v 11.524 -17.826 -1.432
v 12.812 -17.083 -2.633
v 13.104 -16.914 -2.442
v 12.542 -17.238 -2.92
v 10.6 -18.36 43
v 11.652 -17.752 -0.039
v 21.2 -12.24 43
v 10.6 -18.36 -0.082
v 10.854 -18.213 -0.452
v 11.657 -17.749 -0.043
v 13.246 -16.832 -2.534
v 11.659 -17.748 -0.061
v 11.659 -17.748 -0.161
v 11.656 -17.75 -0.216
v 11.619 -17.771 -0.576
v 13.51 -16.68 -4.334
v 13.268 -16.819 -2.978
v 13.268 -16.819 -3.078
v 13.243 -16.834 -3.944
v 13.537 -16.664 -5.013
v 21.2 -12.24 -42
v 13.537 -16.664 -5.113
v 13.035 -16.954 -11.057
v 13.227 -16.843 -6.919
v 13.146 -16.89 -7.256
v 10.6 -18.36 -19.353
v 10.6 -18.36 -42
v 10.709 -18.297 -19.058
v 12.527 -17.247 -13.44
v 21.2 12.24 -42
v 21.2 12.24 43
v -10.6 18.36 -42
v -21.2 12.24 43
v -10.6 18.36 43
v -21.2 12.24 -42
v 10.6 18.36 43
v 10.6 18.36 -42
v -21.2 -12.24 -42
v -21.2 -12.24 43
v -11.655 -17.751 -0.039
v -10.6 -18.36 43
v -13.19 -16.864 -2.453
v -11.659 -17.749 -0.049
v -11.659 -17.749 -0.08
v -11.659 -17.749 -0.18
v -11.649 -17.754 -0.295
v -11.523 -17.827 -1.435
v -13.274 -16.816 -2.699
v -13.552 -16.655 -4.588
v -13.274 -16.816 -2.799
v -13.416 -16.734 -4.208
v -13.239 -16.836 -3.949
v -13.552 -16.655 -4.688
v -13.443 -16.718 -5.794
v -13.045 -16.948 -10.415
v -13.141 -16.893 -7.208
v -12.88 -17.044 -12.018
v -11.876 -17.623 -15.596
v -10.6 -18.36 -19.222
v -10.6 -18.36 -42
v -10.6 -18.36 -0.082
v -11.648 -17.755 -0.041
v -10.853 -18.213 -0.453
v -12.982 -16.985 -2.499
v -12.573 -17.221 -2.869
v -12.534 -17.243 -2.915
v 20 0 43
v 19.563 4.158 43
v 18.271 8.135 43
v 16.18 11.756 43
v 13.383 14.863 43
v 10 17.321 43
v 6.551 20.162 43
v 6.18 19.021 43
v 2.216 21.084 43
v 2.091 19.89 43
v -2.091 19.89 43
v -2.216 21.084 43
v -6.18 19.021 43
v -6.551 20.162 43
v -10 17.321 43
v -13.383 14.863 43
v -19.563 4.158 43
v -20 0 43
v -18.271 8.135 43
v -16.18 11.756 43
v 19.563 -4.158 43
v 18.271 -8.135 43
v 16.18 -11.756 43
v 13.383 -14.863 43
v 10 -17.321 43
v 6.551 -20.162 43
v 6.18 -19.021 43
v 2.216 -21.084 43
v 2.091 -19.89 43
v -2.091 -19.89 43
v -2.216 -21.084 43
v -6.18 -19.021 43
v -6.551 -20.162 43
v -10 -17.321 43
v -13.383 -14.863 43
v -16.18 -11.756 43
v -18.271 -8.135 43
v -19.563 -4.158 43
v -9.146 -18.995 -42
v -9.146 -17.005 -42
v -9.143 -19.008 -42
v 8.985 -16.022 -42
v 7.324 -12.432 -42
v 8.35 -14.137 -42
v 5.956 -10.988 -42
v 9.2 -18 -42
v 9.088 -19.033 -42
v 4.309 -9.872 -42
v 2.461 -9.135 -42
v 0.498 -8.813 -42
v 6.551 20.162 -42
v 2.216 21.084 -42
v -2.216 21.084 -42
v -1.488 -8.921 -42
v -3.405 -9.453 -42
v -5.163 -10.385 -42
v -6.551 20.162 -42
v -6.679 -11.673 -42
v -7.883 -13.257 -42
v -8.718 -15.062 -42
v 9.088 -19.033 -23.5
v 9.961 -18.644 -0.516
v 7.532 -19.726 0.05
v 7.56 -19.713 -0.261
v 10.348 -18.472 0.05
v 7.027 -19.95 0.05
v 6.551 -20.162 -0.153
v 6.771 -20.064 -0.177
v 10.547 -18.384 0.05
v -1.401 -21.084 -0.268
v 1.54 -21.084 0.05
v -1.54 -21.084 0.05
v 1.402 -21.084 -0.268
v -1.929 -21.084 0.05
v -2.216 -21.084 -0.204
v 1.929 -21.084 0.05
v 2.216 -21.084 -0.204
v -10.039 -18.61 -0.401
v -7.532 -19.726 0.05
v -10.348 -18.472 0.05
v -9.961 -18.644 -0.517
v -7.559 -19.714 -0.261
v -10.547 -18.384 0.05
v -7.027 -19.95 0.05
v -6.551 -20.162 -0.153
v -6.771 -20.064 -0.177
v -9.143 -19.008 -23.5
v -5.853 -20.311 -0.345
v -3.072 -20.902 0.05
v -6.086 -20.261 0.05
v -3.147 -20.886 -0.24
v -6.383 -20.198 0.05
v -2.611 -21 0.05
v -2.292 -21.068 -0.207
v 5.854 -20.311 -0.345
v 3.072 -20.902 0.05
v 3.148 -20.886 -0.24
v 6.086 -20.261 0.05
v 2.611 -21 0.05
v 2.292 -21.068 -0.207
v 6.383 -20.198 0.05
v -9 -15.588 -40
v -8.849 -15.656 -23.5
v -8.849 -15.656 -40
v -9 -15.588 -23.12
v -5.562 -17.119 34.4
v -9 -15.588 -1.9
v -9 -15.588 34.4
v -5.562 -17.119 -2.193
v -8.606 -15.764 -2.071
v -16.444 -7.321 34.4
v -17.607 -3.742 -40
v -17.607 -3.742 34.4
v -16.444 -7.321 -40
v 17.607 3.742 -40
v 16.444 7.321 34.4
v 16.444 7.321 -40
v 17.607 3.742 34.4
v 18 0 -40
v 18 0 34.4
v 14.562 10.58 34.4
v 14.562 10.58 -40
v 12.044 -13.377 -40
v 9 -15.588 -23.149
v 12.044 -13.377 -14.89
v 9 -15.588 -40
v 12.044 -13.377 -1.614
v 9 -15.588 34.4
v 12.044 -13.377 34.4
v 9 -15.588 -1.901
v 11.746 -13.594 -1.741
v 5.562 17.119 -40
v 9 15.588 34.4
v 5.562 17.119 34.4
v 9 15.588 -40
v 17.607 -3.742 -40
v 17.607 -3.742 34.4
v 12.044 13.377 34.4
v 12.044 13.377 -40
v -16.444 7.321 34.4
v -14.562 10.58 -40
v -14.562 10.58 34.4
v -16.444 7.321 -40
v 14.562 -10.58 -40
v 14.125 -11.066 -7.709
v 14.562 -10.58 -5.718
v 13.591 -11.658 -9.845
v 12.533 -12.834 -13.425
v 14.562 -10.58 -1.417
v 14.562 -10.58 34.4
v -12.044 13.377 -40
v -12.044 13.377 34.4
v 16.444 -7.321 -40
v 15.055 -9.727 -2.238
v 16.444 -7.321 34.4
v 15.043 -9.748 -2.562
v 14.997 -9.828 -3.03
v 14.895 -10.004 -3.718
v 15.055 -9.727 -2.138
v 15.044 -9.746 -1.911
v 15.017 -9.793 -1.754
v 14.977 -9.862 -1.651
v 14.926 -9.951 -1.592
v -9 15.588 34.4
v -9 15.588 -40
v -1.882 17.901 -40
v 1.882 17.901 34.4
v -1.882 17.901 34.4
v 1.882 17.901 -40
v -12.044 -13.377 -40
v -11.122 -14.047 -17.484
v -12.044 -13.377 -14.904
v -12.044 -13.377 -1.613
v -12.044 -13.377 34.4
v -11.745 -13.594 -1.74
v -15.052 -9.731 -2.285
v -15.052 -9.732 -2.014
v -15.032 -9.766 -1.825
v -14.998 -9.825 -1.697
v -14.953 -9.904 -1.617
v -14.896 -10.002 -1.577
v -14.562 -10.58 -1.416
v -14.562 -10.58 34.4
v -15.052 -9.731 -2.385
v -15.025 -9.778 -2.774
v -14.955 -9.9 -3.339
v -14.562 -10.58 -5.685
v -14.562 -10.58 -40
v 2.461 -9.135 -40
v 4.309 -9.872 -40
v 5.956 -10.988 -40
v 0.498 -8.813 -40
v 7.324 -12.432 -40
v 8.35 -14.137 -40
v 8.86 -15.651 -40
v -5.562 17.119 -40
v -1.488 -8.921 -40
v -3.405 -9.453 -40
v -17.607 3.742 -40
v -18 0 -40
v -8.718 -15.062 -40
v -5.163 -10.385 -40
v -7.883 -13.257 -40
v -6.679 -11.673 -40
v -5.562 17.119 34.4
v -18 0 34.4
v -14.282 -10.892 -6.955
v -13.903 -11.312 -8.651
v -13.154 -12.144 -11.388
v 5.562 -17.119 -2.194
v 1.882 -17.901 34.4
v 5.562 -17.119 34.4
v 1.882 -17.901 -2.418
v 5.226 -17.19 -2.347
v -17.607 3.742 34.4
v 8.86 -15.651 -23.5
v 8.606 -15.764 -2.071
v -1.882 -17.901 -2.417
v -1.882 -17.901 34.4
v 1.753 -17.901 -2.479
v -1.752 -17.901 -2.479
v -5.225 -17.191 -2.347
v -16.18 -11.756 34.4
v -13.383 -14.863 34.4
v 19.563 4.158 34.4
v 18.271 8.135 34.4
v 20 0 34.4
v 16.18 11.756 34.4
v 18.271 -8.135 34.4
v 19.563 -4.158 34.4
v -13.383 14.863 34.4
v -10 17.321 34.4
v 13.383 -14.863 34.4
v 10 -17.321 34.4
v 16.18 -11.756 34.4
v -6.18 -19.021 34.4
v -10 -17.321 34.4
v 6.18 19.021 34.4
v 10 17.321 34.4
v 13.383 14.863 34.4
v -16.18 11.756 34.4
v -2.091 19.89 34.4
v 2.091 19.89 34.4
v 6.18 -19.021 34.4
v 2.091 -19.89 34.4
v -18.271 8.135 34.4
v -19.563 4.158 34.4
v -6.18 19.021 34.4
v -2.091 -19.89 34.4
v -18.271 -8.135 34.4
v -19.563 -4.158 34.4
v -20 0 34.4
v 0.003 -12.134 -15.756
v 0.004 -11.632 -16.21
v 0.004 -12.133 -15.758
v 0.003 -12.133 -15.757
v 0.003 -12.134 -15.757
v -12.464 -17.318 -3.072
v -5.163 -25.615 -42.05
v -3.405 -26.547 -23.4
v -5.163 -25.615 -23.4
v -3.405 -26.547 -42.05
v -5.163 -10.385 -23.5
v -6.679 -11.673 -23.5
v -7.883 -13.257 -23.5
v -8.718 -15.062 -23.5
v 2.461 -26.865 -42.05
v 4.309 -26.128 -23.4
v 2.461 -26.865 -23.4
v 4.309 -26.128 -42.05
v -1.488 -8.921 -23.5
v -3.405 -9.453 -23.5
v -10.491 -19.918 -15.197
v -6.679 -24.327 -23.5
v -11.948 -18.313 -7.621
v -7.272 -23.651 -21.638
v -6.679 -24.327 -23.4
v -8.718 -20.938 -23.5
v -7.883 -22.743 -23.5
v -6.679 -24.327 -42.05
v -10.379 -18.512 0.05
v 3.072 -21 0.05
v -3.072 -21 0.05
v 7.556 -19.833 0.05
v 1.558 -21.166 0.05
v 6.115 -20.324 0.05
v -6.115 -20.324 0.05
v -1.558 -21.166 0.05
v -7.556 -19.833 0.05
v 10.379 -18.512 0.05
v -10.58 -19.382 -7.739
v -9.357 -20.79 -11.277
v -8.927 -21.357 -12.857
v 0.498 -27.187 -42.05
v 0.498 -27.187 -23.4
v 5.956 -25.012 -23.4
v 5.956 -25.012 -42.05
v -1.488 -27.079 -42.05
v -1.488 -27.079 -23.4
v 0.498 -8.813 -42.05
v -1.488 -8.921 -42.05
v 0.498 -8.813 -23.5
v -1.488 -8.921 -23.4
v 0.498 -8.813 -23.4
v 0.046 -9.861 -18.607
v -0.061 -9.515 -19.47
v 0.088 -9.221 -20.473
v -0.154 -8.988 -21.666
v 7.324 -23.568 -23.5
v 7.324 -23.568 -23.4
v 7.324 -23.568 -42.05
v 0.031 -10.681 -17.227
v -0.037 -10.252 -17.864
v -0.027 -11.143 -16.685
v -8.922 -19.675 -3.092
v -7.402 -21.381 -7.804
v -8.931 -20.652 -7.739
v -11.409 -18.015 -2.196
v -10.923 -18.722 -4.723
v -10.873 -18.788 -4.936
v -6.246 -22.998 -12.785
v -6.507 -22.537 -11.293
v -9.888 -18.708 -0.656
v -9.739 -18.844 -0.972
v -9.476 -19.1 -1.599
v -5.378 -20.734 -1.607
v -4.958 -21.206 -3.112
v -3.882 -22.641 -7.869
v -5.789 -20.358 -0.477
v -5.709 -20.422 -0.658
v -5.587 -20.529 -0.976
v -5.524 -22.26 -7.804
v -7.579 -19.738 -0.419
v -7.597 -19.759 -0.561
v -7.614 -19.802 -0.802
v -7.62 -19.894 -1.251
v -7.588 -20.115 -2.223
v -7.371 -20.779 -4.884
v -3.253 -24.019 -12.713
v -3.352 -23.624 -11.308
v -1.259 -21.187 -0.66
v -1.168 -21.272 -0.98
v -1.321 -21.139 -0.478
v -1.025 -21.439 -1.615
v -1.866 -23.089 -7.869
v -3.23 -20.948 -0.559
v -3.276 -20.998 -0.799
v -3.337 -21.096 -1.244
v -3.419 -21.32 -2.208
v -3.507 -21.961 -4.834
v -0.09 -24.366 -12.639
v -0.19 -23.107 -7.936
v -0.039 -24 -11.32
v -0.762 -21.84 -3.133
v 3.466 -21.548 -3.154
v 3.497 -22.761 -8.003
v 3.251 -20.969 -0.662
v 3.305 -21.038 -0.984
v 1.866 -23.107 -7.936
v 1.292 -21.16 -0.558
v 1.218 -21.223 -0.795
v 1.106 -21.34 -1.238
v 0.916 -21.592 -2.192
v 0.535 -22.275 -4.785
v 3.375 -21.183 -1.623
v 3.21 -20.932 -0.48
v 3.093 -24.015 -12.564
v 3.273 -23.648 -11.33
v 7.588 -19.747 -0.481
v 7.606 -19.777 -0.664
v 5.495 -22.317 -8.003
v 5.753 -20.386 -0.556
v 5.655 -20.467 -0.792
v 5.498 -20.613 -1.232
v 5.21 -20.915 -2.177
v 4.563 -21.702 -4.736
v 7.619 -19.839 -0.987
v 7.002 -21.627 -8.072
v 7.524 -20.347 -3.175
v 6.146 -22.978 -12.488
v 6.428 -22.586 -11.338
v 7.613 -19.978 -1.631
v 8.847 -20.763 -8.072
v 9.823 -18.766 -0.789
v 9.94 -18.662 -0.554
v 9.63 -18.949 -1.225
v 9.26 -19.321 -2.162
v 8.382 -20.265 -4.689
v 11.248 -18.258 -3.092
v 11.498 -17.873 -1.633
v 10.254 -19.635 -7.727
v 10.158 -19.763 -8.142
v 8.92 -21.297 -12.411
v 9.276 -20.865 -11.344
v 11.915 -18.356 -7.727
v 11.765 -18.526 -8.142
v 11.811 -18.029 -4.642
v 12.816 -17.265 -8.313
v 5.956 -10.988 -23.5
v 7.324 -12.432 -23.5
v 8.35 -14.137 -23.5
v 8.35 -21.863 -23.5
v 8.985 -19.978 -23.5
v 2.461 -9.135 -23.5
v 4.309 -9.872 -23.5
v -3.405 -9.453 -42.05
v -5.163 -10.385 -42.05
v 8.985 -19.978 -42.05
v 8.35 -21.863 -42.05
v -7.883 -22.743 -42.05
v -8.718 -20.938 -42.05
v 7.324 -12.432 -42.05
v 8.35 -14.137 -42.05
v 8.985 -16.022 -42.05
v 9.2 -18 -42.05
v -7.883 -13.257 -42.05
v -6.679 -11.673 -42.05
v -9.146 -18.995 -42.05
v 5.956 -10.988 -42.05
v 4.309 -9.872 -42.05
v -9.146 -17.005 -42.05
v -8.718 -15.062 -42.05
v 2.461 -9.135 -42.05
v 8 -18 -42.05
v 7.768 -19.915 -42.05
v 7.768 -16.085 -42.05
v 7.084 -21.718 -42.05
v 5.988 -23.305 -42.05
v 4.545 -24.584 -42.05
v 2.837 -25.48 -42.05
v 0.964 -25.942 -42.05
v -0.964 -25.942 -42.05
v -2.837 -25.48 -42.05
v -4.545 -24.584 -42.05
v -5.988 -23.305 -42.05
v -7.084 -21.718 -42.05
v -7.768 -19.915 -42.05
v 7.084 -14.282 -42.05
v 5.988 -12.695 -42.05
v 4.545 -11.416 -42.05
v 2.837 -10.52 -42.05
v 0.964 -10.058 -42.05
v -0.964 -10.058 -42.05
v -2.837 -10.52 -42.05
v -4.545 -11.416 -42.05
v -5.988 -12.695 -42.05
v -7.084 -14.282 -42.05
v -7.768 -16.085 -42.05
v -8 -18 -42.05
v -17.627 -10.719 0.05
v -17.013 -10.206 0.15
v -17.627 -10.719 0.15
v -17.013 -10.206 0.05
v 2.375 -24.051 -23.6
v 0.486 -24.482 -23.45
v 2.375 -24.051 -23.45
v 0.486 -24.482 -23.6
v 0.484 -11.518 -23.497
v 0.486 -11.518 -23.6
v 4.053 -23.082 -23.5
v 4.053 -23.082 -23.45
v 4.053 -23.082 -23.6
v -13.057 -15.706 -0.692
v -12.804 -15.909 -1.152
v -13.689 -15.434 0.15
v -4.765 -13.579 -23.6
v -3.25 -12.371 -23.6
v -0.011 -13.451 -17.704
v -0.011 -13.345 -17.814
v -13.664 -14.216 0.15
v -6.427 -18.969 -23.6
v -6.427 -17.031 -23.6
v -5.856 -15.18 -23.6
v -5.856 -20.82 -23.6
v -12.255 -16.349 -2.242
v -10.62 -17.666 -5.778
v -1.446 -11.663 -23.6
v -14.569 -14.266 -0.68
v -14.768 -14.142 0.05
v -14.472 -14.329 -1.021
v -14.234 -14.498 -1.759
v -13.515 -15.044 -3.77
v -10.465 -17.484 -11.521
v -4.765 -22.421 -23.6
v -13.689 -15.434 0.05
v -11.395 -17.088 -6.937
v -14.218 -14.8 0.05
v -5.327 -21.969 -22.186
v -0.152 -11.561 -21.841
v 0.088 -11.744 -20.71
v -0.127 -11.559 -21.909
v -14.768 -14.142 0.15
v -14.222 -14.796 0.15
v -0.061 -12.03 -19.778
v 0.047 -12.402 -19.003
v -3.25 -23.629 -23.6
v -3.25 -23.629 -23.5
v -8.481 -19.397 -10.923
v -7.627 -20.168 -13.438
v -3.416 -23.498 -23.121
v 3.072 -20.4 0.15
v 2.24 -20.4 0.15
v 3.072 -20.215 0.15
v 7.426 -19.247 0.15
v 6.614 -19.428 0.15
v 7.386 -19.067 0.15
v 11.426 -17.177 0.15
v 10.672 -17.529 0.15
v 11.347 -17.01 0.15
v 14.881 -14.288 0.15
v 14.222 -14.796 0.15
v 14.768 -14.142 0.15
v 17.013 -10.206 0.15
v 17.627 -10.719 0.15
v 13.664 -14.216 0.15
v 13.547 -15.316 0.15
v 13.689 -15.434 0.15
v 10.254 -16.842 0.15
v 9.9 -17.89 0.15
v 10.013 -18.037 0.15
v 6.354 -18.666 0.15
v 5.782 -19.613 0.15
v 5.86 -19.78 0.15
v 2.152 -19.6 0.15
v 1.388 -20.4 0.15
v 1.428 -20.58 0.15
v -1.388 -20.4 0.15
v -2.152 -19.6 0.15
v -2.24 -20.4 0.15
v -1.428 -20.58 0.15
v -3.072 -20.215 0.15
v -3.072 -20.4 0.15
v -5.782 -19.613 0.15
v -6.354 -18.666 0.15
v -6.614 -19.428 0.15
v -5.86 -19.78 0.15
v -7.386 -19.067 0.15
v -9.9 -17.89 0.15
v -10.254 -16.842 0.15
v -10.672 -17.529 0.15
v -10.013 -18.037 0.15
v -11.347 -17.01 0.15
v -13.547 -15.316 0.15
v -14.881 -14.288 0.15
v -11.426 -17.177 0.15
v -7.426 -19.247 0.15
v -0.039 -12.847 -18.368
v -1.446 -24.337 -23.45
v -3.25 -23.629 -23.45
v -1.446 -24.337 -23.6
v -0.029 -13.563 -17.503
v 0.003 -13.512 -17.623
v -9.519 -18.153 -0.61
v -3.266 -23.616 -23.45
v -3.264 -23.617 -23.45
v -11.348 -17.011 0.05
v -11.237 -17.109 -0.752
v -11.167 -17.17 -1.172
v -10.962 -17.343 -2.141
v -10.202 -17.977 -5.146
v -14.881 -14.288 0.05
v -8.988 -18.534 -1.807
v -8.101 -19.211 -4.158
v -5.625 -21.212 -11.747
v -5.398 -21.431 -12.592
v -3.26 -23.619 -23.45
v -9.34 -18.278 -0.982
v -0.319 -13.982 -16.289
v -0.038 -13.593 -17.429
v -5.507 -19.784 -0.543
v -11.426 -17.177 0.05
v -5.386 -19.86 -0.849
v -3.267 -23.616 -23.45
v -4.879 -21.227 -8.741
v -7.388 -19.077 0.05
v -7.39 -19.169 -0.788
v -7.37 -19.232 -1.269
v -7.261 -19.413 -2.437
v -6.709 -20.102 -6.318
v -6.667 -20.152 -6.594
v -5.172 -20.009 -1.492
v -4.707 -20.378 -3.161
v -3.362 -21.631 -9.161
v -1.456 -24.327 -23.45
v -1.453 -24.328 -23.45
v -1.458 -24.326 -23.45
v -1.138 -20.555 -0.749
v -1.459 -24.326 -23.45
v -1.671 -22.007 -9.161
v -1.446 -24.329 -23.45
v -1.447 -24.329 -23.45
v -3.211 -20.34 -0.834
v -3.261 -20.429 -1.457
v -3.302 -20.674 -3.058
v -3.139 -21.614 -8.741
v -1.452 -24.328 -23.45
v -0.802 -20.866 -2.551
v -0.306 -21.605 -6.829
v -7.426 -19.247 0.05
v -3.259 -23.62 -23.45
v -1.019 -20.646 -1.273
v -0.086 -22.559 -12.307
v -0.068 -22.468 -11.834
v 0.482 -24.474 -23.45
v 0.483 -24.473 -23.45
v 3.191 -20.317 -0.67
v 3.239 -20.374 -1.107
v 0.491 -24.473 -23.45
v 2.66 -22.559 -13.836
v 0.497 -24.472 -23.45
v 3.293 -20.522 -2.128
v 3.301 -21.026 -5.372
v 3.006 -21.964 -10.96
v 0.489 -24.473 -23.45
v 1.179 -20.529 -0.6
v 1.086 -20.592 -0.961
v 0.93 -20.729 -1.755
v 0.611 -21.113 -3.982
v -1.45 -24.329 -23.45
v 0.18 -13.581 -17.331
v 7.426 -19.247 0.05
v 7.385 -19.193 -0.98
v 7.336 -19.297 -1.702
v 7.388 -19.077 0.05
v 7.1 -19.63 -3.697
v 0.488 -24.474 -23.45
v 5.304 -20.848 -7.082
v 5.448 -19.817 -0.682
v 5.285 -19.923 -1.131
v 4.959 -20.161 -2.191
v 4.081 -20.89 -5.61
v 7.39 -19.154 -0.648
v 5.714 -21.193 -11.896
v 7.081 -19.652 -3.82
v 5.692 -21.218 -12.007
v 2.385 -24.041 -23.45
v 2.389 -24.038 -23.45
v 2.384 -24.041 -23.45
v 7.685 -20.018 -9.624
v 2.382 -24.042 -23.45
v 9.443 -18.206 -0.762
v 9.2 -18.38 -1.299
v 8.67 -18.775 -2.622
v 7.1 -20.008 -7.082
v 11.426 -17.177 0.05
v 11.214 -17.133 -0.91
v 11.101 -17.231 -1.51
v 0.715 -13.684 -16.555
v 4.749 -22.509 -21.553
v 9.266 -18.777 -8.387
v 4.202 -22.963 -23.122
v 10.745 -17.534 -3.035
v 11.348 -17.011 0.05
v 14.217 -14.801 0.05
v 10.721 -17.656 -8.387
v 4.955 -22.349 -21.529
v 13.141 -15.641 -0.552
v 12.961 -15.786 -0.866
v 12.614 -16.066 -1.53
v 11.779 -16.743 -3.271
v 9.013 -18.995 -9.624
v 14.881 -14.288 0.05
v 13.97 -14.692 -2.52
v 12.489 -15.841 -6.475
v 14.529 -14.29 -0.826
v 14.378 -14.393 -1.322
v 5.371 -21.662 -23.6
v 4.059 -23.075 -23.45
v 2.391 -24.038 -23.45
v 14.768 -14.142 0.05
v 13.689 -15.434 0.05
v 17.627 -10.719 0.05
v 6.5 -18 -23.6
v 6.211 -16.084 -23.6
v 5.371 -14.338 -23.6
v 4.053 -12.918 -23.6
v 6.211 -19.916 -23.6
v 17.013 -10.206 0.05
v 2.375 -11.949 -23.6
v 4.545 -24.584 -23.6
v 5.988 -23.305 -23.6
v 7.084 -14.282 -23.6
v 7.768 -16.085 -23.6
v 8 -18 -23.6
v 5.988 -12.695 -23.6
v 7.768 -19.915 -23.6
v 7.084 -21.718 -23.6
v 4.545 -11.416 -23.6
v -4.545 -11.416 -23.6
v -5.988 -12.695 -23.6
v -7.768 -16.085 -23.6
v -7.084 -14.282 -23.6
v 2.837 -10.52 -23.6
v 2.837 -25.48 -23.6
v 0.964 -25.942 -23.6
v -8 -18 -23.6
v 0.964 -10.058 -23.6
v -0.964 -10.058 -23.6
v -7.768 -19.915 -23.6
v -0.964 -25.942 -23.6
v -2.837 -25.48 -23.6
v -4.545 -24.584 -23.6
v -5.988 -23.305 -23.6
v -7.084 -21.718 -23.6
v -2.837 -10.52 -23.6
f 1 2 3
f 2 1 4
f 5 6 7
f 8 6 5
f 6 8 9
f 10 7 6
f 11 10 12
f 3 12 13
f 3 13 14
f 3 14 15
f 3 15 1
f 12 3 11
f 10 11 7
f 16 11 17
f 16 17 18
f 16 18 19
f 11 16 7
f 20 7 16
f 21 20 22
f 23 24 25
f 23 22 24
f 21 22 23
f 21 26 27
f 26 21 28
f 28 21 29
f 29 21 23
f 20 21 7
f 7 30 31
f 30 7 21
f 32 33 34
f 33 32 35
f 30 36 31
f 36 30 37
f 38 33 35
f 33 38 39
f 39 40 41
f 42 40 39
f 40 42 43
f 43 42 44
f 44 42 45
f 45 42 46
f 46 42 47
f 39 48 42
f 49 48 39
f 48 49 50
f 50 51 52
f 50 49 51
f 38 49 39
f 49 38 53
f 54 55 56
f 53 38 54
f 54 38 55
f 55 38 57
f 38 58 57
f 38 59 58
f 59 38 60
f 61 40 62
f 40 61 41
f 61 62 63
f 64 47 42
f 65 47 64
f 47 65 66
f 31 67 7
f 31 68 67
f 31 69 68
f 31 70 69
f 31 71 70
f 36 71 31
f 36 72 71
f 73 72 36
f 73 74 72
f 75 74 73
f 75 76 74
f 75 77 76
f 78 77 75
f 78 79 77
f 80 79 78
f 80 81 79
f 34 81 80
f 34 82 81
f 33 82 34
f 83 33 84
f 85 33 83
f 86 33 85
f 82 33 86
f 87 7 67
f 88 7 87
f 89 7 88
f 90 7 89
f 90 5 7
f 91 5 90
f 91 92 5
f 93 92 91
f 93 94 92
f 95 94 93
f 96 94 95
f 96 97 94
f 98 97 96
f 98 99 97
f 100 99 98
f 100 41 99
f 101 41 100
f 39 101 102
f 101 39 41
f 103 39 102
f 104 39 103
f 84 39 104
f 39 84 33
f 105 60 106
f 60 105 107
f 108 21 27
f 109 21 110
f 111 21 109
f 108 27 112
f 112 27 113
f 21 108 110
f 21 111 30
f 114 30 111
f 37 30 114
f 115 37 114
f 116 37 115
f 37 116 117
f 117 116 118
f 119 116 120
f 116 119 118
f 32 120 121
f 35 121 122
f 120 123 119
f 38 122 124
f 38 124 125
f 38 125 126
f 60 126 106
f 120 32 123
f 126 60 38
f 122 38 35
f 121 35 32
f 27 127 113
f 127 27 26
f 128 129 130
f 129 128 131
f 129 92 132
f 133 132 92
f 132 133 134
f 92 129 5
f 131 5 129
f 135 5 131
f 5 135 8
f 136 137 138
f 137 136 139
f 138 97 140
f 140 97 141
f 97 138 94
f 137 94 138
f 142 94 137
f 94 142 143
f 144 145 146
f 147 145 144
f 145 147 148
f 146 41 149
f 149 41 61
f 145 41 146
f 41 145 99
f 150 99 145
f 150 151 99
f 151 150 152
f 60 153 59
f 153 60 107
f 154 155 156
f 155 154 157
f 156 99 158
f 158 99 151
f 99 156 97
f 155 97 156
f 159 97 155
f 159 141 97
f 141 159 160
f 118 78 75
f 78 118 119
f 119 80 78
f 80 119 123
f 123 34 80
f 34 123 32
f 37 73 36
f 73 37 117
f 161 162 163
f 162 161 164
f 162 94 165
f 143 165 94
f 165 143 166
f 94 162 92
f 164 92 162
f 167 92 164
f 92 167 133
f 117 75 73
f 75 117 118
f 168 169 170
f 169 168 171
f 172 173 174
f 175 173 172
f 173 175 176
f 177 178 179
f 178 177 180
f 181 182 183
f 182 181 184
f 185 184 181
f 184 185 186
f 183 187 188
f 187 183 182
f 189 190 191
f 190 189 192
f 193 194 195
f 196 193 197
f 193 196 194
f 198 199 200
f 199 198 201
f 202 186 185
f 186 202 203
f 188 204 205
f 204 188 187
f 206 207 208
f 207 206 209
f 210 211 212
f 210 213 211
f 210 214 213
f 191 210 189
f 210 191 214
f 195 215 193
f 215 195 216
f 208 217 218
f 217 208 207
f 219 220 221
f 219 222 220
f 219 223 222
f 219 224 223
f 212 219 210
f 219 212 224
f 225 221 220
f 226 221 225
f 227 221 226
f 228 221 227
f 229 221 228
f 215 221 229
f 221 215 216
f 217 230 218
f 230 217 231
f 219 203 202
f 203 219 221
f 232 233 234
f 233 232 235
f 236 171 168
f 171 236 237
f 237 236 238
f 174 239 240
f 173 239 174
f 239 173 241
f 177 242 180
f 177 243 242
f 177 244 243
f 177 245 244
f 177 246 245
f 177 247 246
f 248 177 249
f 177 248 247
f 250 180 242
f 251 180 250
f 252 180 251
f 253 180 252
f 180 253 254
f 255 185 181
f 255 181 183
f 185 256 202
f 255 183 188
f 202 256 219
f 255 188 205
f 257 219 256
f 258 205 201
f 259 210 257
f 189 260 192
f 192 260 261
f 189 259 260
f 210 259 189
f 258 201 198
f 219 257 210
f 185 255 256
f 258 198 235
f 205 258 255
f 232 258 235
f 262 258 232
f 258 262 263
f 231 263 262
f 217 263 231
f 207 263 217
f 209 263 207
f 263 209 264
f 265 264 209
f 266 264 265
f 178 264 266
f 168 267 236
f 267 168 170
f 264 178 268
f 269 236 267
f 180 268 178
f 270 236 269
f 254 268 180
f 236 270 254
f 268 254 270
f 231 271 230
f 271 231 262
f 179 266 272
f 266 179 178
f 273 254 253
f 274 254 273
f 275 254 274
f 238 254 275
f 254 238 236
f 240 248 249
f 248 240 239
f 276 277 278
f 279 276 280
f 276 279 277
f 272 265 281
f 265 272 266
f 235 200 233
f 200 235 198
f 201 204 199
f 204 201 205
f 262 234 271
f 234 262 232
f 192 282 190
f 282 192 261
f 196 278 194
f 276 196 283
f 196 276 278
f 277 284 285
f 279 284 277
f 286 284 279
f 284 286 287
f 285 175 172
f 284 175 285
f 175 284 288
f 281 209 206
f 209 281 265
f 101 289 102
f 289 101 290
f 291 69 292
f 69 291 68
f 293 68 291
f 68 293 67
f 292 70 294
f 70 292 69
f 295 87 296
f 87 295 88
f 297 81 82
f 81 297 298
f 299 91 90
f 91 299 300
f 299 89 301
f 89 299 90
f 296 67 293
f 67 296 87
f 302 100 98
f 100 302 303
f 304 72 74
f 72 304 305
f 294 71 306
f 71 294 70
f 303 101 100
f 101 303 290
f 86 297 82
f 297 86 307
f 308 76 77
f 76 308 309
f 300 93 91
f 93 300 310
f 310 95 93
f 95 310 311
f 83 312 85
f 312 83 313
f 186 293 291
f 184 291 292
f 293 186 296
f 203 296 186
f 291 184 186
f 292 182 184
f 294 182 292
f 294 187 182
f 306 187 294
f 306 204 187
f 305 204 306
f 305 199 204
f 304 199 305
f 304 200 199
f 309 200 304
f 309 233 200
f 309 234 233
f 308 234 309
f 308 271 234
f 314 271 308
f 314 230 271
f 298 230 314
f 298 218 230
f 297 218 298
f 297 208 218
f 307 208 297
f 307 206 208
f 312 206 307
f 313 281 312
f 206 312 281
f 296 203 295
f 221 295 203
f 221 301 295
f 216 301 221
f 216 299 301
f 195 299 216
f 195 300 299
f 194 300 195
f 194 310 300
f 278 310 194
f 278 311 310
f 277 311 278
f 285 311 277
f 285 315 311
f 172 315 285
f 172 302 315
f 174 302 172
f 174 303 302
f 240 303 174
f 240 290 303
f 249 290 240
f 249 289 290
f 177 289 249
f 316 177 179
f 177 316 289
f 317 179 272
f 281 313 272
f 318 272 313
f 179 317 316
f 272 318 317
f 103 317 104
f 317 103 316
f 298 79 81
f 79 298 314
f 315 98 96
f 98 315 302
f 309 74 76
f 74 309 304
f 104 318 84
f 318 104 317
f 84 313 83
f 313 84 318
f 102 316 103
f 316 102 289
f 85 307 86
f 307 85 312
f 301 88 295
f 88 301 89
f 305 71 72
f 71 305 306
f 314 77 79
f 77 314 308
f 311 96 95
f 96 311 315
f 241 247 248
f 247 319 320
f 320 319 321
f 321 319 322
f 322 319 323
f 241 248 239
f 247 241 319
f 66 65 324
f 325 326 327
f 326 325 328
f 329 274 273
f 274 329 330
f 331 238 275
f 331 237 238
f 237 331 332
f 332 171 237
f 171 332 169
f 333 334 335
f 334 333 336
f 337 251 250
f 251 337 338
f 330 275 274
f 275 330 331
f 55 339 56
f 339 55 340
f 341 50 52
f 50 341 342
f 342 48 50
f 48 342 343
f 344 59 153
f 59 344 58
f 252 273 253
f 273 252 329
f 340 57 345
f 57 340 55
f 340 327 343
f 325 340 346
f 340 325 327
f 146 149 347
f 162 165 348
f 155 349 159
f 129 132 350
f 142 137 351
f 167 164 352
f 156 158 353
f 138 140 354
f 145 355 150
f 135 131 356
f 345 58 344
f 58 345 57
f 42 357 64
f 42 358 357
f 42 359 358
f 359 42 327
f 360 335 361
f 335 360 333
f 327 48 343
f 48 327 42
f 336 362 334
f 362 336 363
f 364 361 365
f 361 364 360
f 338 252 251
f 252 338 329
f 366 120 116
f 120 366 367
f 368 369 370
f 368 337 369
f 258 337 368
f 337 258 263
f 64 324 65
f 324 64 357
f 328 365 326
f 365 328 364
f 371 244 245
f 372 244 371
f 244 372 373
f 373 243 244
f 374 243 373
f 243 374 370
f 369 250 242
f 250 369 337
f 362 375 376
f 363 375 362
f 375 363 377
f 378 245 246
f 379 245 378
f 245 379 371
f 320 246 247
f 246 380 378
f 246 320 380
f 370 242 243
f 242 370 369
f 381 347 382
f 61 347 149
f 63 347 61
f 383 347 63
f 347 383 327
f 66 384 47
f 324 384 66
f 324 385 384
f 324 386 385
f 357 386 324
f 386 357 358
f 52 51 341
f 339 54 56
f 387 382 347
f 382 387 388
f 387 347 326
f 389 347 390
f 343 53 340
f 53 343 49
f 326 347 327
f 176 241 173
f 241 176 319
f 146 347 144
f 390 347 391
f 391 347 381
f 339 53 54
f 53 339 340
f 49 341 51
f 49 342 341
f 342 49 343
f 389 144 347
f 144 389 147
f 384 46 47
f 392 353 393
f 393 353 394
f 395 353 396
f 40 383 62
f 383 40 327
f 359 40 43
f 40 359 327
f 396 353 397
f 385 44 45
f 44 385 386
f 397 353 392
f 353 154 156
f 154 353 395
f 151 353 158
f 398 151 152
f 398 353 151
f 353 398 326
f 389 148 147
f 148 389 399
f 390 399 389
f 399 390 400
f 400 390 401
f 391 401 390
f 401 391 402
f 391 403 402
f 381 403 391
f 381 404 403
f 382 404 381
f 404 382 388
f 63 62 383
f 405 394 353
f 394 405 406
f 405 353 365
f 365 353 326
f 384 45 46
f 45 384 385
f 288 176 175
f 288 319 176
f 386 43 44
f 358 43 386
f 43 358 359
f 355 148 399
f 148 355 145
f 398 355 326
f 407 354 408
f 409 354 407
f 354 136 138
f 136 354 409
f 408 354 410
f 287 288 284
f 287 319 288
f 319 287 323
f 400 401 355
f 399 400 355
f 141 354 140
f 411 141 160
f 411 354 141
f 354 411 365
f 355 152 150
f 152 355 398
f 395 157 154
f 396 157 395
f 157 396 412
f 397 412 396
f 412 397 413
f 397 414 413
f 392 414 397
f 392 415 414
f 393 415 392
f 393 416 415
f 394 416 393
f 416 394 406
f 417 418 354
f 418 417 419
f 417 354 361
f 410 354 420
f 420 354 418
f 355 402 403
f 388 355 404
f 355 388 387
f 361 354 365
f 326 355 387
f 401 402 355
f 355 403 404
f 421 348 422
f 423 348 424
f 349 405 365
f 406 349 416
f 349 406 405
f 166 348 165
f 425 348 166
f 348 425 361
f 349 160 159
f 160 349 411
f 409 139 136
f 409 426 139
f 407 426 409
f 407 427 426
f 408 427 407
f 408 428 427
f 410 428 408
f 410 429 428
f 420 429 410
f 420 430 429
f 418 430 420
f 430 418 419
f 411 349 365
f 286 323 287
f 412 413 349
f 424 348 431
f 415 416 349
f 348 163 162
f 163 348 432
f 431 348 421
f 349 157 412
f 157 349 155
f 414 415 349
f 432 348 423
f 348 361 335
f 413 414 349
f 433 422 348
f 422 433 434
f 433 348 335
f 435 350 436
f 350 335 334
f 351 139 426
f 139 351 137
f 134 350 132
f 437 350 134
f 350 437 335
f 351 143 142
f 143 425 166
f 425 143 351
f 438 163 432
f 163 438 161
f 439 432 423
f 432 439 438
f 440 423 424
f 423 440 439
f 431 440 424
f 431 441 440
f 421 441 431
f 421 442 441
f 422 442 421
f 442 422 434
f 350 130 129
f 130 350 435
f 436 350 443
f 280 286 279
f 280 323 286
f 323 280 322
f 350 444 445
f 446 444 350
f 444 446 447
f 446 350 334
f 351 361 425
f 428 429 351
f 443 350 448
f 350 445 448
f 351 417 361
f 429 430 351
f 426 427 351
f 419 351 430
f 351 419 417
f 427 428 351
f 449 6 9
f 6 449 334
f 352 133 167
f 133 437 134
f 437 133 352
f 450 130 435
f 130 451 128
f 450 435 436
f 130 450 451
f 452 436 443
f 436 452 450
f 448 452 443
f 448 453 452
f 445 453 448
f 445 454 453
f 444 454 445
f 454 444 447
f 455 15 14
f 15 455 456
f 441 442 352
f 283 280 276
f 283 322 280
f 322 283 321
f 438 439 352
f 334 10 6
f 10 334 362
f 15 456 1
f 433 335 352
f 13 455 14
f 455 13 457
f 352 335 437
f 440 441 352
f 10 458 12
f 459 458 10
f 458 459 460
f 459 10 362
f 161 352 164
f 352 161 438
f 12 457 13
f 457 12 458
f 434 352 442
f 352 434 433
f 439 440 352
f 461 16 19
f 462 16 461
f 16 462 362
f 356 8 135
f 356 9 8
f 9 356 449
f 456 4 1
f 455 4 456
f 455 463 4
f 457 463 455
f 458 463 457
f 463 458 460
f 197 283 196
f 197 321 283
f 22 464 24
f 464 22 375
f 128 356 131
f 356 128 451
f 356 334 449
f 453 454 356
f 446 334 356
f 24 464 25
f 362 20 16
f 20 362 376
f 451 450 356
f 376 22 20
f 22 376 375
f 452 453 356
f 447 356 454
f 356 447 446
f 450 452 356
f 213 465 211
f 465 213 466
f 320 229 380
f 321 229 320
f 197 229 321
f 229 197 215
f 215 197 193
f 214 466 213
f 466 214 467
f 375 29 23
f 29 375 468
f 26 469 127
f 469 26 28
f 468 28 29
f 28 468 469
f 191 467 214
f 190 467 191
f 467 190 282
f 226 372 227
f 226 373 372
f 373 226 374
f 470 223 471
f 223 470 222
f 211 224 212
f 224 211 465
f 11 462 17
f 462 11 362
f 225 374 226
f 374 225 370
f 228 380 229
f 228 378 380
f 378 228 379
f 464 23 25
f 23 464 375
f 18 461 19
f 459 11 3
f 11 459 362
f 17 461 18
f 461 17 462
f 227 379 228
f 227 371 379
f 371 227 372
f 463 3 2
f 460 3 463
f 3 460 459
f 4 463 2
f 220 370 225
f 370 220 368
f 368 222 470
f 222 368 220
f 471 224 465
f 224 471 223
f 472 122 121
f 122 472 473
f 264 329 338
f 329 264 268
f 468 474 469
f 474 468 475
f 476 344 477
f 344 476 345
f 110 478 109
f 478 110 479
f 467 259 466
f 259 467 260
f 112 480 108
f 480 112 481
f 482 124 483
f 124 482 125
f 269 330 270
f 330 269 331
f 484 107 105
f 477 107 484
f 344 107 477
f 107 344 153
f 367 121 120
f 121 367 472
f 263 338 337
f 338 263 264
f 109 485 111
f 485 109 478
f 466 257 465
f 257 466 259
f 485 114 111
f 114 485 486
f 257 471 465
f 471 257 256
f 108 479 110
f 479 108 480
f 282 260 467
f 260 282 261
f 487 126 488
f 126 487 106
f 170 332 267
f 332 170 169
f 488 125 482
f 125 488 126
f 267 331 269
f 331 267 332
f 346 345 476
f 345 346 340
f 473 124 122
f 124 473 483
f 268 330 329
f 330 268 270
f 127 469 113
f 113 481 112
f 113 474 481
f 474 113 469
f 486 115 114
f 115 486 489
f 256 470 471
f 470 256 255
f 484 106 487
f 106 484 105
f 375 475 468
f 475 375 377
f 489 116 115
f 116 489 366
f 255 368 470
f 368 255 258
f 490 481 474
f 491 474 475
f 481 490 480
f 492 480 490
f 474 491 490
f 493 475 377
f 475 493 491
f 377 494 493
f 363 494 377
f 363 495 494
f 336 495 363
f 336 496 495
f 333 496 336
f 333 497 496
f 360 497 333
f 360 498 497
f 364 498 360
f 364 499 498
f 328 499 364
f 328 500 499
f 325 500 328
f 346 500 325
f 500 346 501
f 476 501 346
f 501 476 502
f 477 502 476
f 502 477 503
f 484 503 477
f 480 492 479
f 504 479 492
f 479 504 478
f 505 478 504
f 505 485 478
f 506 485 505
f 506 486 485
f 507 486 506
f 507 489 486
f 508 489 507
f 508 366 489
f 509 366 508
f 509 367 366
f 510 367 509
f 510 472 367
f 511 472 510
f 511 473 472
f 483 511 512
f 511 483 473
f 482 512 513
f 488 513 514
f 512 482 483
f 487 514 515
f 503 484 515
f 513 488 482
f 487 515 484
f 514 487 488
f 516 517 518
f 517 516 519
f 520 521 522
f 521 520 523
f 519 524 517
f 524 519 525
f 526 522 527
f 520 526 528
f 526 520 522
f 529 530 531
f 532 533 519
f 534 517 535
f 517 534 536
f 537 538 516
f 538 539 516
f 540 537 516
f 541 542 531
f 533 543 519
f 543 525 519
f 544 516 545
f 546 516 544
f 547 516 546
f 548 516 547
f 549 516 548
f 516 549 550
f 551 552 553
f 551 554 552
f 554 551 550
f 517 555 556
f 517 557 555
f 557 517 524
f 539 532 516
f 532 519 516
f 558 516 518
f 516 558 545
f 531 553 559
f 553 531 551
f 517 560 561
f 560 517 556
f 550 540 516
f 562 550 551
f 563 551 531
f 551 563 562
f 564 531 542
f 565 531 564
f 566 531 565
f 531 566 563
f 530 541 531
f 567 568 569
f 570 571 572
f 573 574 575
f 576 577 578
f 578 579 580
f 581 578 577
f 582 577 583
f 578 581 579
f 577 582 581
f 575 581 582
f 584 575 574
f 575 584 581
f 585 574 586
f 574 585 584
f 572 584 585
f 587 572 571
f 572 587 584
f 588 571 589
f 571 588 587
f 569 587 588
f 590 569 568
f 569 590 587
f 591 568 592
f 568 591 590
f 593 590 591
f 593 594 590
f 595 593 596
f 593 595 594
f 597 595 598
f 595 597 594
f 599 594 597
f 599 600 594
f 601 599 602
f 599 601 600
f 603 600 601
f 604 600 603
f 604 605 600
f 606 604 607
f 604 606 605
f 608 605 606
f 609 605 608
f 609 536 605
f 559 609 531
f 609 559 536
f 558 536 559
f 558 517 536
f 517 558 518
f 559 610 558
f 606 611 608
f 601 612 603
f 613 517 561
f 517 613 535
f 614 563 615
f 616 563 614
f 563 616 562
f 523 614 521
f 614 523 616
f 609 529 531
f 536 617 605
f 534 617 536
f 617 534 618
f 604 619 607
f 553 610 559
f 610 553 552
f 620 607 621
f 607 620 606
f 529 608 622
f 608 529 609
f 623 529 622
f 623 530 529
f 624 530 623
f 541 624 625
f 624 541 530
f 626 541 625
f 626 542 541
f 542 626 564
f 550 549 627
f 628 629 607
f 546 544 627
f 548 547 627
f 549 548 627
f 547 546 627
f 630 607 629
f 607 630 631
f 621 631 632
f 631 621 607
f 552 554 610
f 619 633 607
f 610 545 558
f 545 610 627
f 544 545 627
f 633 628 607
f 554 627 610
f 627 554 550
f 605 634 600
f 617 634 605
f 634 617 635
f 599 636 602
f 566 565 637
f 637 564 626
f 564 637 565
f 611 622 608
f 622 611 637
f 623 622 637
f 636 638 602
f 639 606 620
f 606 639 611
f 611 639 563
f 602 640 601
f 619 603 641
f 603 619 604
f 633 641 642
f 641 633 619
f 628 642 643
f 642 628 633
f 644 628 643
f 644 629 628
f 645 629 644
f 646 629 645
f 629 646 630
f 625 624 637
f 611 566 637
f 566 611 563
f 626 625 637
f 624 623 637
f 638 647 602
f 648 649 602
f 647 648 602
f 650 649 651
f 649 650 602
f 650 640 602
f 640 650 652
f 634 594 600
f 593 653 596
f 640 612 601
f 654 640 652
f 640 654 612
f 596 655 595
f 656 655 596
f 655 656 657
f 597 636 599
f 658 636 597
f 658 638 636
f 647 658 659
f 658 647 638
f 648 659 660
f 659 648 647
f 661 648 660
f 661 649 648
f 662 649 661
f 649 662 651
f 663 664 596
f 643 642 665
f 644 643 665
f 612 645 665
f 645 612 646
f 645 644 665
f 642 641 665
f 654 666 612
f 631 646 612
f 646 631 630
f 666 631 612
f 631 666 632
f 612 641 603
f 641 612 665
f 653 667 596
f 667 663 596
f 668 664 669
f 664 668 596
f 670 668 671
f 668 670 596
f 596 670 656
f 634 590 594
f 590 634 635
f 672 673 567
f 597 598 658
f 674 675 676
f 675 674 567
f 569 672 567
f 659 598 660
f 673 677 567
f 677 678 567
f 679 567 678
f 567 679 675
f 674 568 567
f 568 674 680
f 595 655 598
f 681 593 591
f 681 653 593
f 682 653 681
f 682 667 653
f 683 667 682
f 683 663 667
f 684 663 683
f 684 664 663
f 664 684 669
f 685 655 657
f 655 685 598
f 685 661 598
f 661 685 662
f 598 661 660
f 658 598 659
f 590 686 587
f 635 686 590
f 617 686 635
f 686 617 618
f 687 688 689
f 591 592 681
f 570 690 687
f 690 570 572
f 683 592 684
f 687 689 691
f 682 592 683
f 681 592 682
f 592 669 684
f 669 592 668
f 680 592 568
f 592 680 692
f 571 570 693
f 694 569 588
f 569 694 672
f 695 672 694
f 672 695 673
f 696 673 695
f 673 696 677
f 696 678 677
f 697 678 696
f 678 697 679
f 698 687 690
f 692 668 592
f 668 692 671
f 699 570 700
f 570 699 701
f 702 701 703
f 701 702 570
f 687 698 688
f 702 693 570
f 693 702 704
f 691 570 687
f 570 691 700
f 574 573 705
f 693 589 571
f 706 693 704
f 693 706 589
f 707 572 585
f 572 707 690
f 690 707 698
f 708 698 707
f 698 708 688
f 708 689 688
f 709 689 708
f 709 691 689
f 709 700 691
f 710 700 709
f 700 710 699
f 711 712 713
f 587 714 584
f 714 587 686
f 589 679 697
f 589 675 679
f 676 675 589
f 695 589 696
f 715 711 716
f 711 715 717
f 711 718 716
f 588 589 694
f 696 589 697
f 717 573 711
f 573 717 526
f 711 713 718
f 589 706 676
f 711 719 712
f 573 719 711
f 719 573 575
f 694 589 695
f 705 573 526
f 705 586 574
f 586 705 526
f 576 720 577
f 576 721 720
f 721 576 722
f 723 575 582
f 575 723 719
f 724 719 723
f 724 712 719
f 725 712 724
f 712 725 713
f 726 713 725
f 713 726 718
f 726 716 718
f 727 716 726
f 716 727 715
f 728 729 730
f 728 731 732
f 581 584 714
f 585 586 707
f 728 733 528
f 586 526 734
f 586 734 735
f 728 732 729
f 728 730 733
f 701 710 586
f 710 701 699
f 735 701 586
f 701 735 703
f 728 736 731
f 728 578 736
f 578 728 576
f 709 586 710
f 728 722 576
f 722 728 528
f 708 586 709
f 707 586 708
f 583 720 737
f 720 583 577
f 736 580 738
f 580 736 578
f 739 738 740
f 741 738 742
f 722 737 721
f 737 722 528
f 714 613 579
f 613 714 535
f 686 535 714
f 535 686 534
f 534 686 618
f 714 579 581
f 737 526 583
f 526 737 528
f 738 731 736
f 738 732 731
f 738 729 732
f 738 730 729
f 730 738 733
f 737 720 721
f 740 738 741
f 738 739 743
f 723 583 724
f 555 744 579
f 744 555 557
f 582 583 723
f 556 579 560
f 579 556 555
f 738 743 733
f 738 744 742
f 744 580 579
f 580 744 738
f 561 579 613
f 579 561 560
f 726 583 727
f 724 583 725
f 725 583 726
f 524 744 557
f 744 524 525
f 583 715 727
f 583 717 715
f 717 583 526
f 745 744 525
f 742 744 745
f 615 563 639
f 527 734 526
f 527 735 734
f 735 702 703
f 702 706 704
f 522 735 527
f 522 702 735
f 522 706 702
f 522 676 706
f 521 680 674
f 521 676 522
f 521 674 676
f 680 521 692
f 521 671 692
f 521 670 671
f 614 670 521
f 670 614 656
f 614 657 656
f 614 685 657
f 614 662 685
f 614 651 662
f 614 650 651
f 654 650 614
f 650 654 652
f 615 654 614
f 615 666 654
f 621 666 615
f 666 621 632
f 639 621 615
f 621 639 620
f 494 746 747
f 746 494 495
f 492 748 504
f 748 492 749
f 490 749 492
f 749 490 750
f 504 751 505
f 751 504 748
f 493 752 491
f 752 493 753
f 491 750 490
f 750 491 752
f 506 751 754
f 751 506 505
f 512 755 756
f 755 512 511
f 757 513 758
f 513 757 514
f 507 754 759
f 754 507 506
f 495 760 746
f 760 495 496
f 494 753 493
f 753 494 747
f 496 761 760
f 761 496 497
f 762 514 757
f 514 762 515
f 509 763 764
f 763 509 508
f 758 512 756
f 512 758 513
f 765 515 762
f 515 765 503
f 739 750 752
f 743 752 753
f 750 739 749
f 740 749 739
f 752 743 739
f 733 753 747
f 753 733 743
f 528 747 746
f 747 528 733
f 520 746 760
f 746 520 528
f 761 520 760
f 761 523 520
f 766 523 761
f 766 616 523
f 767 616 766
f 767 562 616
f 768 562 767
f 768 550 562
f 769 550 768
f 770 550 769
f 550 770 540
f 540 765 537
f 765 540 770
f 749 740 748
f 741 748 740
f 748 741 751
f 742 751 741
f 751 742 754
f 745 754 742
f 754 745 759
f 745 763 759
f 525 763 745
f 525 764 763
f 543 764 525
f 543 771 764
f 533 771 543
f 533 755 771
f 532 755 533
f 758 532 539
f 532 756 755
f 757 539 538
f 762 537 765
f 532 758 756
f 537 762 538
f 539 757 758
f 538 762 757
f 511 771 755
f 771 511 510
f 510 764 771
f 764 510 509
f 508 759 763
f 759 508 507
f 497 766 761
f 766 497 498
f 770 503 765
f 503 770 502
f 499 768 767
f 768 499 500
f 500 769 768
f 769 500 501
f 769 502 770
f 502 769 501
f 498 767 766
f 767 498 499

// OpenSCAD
// file: common.scad
module basicShape(height)
translate ([0, 0, ground]) union(){
    difference(){
	   	union(){
	        intersection(){
	            rotate ([0, 0, 30]) cylinder_outer(height, (outerDiameter*0.5+minWallThickness), 6);
	            translate ([0,0,(height/2)]) cube ([outerDiameter*2, (sqrt(3)*(outerDiameter*0.5+minWallThickness)), height], center = true);
	 	    };
	        cylinder(height, d=(outerDiameter + 2* minWallThickness)); 
	   	};
        union(){
        	translate ([0, 0, floorThickness]) cylinder(height, d=innerDiameter, center=false);
        	translate ([0, 0, (height - pipeInsert)]) cylinder(height, d=outerDiameter, center=false);
        };
    };
};


module cylinder_outer(height,radius,fn){  	//from https://en.wikibooks.org/wiki/OpenSCAD_User_Manual/undersized_circular_objects
   fudge = 1/cos(180/fn);
   cylinder(h=height,r=radius*fudge,$fn=fn);
}
   
module curvedFlueLoft(upperDiameter, lowerDiameter, loftCeiling, loftFloor){
    union(){
        hull(){
        	translate([0, airSupplyY, loftFloor]) cylinder(h=0.1, d=lowerDiameter, center=true);
        	translate([0, airSupplyY, (ground + tubeInsert)])cylinder(h=0.1, d=lowerDiameter, center=true);
        }
       	for (a = [(angle*-0.5) : (angle/flueSteps) : (angle*0.5)])
            hull(){
            rotate ([0, 0, a]) translate ([0, (outerDiameter*-0.5), loftCeiling]) cube ([flueStepWidth, upperDiameter, 0.1], center=true);
            translate ([0, airSupplyY, (loftFloor + tubeInsert)]) cylinder (0.1, d=lowerDiameter);
        };
    };
}

module outerCurvedLoft(){
    curvedFlueLoft(    
        upperDiameter = (flueWidth + minWallThickness), 
        lowerDiameter = (outerTube + 2 * minWallThickness),
        loftCeiling = 0,
        loftFloor = ground
    );
}

module innerCurvedLoft(){
    curvedFlueLoft(
        upperDiameter = flueWidth, 
        lowerDiameter = innerTube, 
        loftCeiling = 0.1, 
        loftFloor = (ground-0.1)
    ); 
}
    
module outerCurvedLoft2(){
    curvedFlueLoft2(    
        upperDiameter = (flueWidth + minWallThickness), 
        lowerDiameter = (outerTube + 2 * minWallThickness),
        loftCeiling = 0,
        loftFloor = ground
    );
}

module innerCurvedLoft2(){
    curvedFlueLoft2(
        upperDiameter = flueWidth, 
        lowerDiameter = innerTube, 
        loftCeiling = 0.1, 
        loftFloor = (ground-0.1)
    ); 
}

module airSupplySpacer(){
    translate ([0, airSupplyY, (ground-0.1)]) 
    cylinder (tubeInsert, d=outerTube, center=false);
}
// main file
// flue pippe. work in progress.

include <common.scad>

// variables
outerDiameter = 40;
innerDiameter = 36;
labiumWidth = 35;
outCut = 10;
lengthFlue = 40; //coordinate this with the frequency
outerTube = 16;
innerTube = 13;
minWallThickness = 1.2;
floorThickness = 2;
flueWidth = 0.8;
flueSteps = 8; 

// proportions, are most likely good like that
tubeInsert = outerTube + 2.5;       // length
pipeInsert = innerDiameter * 0.1 + 5; // length
airSupplyY = outerDiameter*-0.45;    // y position of air supply
height = 85; // die 85 ist testweise, muss die Höhe noch entscheiden

// calculations, don't touch in production use
labiumX = sin(labiumWidth * 180 / outerDiameter / PI) * outerDiameter; 
angle = labiumWidth * 360 / outerDiameter / PI;
ground = (lengthFlue + floorThickness)*-1;
flueStepWidth = labiumWidth * 180 / (outerDiameter+flueWidth) / PI / flueSteps;
soundingLength = height - pipeInsert - floorThickness;

// announcing sounding length
echo("the sounding length inside the model in mm:", soundingLength);

// flueLength warning
if (lengthFlue < outerTube * 2)
    echo("lengthFlue is too short");

// logic
difference(){
    union(){
        basicShape(height); 
        outerCurvedLoft();
    };
    union(){
        innerCurvedLoft(); 
        airSupplySpacer();
    };
};


/* todo:
Labiumcut
figure out polyhedron
assembly
height
*/

echo(version=version());
